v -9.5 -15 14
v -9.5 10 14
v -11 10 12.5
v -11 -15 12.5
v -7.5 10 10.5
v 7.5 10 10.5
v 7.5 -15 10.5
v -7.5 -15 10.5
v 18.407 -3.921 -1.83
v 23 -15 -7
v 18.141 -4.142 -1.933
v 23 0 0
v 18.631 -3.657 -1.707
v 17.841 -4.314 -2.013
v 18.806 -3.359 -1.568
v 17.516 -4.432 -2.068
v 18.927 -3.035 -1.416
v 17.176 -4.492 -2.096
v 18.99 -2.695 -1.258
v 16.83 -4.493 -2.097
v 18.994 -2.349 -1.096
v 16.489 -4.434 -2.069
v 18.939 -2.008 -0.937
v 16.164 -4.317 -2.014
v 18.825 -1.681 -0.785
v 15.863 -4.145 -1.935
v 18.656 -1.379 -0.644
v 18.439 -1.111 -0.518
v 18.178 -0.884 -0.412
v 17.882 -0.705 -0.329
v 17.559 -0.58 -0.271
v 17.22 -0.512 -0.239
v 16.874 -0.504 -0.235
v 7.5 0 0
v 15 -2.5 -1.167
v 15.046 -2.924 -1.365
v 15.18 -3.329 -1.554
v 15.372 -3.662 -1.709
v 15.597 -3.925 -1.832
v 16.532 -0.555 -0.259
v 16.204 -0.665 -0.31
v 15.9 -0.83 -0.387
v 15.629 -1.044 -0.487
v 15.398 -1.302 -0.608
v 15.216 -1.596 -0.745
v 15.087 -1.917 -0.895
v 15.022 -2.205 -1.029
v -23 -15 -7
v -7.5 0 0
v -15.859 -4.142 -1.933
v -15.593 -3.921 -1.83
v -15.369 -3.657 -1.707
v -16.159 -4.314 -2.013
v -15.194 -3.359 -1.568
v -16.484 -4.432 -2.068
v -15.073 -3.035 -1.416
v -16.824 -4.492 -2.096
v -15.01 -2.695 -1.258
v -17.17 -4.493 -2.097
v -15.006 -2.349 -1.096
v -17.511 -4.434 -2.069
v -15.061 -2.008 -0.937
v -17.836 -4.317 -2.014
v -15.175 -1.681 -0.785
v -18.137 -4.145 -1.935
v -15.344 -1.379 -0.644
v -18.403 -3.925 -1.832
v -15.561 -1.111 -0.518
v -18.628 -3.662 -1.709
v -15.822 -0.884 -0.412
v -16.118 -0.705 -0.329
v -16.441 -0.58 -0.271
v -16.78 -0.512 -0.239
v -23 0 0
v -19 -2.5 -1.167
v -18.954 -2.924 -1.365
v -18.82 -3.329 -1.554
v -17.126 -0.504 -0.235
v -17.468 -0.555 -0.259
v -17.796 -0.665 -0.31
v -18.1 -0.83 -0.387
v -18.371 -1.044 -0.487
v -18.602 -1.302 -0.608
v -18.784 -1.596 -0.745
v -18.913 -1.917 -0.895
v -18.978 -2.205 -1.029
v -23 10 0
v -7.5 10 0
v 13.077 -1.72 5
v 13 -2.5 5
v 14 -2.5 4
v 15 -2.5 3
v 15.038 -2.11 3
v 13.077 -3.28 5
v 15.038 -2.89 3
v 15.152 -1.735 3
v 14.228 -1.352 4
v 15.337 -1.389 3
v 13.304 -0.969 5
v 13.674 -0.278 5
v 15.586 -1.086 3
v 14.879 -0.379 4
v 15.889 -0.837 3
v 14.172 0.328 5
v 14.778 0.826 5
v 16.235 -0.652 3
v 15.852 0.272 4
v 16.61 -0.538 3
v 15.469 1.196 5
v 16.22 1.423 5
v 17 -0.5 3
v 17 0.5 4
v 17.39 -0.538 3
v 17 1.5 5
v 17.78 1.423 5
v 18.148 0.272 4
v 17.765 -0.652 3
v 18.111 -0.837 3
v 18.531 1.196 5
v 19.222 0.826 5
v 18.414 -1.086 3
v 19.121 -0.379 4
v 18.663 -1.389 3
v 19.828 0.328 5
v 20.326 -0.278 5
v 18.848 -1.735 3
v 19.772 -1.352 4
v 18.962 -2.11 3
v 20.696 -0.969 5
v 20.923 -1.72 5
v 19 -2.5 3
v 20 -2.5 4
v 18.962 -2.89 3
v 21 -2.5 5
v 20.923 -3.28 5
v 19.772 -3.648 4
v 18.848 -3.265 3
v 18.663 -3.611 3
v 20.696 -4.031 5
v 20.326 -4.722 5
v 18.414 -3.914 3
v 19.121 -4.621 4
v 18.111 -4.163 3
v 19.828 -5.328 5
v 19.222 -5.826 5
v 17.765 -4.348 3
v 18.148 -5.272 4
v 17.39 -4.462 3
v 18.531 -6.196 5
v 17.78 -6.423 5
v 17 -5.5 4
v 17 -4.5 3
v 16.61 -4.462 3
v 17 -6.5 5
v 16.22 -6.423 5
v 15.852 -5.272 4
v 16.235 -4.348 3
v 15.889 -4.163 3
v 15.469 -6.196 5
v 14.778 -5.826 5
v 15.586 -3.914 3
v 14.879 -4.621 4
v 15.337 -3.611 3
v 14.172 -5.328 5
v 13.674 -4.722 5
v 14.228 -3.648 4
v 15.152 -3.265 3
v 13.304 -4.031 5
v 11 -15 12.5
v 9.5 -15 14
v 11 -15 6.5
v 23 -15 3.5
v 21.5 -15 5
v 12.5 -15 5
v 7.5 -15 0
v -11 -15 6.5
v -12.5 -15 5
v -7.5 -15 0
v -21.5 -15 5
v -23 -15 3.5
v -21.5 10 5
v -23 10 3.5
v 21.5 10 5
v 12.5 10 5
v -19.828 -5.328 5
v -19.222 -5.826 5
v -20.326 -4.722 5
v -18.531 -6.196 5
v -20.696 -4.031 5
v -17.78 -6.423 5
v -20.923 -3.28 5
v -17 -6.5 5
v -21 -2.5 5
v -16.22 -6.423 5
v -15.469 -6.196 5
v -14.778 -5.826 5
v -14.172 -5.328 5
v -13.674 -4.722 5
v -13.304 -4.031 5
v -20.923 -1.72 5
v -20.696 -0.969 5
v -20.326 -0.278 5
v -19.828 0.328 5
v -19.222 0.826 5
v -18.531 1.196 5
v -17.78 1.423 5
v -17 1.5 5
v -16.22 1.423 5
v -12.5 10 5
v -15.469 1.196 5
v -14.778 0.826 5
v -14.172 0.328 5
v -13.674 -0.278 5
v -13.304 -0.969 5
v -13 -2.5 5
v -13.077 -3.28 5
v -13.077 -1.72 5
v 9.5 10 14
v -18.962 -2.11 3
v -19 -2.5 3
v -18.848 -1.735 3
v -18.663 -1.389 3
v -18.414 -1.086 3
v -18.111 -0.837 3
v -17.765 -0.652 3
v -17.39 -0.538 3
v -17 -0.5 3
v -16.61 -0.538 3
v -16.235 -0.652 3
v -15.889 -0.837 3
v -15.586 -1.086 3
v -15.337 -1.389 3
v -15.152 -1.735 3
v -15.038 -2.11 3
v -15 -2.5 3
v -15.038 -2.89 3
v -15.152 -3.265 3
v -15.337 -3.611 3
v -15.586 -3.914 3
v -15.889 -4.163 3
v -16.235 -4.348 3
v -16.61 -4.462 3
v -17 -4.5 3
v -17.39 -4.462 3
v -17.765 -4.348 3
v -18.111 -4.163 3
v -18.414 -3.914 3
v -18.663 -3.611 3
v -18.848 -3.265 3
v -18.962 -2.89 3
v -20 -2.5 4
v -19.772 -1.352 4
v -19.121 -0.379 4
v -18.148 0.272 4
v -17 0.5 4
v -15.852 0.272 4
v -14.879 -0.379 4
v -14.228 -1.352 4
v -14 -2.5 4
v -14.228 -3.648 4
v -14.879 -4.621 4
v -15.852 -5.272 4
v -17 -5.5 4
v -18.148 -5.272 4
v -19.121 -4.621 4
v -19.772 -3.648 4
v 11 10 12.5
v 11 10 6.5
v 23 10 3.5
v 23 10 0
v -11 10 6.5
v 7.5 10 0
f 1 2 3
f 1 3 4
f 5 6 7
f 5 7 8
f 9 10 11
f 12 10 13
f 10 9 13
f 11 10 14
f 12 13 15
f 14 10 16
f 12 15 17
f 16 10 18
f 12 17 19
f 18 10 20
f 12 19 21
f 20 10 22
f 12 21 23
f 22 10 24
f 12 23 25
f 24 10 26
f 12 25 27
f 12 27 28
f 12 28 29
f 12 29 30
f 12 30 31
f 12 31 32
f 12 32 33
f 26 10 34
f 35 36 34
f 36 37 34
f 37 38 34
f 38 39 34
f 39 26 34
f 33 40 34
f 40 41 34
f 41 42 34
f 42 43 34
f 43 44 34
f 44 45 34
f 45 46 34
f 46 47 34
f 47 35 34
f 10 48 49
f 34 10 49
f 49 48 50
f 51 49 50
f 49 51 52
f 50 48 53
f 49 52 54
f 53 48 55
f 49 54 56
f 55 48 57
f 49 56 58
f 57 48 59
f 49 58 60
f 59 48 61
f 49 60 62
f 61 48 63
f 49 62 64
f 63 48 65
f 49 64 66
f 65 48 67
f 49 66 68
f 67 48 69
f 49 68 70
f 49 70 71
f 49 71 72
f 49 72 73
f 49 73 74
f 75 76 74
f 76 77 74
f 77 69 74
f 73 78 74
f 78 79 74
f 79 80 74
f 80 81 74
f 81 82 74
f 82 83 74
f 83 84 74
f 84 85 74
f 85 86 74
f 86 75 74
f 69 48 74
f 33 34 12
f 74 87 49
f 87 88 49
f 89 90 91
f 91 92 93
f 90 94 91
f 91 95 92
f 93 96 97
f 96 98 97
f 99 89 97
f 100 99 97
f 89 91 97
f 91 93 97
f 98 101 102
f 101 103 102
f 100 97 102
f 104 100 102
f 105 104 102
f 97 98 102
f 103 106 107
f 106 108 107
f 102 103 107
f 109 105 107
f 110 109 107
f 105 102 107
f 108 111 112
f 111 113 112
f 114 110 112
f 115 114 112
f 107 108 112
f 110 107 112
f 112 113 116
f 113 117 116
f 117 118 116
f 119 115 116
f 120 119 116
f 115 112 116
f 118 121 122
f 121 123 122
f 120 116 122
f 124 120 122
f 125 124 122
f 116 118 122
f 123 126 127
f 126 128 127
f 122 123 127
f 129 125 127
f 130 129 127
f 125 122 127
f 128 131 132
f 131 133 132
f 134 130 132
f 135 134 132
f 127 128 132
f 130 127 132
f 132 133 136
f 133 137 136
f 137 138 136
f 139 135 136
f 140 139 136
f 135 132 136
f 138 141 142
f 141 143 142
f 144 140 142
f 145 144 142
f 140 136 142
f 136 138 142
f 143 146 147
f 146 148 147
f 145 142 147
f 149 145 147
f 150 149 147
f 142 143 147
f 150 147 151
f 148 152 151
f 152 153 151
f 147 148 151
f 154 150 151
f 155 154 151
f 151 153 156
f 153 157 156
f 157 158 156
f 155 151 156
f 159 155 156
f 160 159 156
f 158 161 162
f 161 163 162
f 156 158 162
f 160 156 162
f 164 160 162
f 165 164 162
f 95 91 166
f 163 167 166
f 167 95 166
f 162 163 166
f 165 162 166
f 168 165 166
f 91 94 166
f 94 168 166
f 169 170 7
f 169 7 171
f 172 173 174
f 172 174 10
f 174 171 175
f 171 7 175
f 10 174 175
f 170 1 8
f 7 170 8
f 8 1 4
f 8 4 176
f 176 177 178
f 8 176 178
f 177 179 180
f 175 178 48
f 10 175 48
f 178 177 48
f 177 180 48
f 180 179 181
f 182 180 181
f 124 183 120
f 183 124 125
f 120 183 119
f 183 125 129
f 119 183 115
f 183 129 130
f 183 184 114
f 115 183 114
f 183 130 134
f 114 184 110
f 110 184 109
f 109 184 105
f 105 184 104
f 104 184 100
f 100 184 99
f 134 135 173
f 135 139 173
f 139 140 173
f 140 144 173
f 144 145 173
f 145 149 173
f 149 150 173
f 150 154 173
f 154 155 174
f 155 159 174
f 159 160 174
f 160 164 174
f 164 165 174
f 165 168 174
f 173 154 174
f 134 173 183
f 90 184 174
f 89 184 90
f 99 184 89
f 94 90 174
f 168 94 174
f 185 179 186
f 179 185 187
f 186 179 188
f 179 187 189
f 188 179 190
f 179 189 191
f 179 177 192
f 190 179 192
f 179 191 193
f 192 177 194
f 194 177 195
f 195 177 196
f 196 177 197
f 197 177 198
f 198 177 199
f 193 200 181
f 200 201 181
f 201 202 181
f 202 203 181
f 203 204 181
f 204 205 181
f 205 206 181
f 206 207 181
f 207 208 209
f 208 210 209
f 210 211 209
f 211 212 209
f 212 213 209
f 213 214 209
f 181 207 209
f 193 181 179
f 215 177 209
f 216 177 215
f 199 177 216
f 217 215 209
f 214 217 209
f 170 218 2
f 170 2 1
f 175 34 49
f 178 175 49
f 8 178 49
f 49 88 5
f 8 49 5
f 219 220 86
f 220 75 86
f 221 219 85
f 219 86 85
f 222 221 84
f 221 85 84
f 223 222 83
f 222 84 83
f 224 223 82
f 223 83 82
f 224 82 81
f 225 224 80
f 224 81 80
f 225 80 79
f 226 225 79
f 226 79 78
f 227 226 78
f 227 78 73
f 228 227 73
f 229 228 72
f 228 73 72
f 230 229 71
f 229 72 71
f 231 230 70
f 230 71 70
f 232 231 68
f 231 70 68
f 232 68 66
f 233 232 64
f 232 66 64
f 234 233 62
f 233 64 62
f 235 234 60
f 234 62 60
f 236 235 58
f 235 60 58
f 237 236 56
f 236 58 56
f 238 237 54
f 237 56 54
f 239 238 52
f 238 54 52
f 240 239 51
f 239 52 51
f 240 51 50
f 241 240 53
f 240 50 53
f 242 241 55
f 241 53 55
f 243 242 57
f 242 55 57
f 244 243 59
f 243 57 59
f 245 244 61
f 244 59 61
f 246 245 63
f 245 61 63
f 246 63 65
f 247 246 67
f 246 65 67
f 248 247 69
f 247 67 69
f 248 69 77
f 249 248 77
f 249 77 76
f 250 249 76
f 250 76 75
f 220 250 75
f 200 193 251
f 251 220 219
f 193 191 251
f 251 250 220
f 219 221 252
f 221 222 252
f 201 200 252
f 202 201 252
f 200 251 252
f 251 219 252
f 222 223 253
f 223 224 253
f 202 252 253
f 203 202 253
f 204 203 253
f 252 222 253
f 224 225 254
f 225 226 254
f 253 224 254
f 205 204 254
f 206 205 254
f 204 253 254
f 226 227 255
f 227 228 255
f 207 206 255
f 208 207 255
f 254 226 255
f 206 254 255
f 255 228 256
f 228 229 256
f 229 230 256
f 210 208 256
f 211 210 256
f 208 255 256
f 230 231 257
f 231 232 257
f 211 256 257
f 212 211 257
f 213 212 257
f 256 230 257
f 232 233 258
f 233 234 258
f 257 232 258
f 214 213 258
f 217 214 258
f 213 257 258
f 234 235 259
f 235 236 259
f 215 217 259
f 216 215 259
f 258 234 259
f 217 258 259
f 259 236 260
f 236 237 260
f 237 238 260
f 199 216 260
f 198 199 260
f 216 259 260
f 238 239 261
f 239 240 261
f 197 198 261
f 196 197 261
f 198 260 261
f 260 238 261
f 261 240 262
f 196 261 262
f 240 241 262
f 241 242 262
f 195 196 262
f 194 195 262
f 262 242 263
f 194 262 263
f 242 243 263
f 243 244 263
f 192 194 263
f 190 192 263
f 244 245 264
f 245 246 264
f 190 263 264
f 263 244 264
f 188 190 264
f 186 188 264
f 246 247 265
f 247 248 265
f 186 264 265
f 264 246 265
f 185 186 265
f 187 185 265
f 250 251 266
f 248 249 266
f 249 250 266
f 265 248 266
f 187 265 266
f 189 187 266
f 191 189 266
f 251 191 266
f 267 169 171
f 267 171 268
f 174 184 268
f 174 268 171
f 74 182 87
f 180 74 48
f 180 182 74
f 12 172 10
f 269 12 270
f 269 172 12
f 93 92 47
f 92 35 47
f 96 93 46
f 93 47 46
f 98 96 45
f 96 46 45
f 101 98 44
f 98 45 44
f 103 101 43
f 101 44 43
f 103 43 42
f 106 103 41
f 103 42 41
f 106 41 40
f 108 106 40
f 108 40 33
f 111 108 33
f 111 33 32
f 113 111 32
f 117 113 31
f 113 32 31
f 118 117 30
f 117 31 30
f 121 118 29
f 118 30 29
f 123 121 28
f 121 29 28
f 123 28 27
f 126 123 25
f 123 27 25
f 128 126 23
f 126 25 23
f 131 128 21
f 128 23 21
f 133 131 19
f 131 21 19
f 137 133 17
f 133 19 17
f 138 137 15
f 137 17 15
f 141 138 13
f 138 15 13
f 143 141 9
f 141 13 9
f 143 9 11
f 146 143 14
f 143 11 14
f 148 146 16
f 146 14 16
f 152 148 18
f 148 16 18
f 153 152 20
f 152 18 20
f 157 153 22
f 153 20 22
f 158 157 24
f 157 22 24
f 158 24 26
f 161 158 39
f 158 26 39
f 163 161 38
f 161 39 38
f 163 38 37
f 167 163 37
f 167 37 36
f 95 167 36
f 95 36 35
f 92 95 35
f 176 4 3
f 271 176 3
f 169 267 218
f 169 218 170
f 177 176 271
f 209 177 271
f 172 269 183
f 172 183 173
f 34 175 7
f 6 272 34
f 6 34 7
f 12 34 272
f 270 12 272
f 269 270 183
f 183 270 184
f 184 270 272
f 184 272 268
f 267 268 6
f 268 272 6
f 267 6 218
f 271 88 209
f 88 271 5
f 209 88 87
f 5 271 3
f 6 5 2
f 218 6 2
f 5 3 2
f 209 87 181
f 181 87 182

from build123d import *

# Parameters (mm, degrees)
F1_DEPTH        = 11
F2_W            = 15
F2_H            = 10.5
F3_DEPTH        = 25.001
F5_DEPTH        = 12
F7_DEPTH        = 12
F8_SIZE         = 1.5
F10_D           = 4
F10_CSINK_D     = 8
F10_CSINK_ANGLE = 90


with BuildPart() as f1:
    # F0 (on Right) → F1 (new body, symmetric)
    with BuildSketch(Plane.YZ):
        Polygon((-15, -7), (0, 0), (10, 0), (10, 14), (-15, 14), align=None)
    extrude(amount=F1_DEPTH, both=True)

    # F2 (on face) → F3 (cut, through all)
    with BuildSketch(Plane(origin=(0, 10, 0), x_dir=(-1, 0, 0), z_dir=(0, 1, 0))):
        with Locations((0, 5.25)):
            Rectangle(F2_W, F2_H)
    extrude(amount=-F3_DEPTH, mode=Mode.SUBTRACT)

    # F4 (on face) → F5 (join)
    with BuildSketch(Plane(origin=(-11, 0, 0), x_dir=(0, -1, 0), z_dir=(-1, 0, 0))):
        Polygon((15, 5), (-10, 5), (-10, 0), (0, 0), (15, -7), align=None)
    extrude(amount=F5_DEPTH)

    # F6 (on face) → F7 (join)
    with BuildSketch(Plane.YZ.offset(11)):
        Polygon((10, 0), (10, 5), (-15, 5), (-15, -7), (0, 0), align=None)
    extrude(amount=F7_DEPTH)

    # F8
    f8_edges = [f1.edges().sort_by_distance(p)[0] for p in [
        (11, -2.5, 5),
        (11, -2.5, 14),
        (-11, -2.5, 14),
        (-11, -2.5, 5),
        (23, -2.5, 5),
        (-23, -2.5, 5),
    ]]
    chamfer(f8_edges, length=F8_SIZE)

    # F10 (through all)
    with Locations(Plane.XY.offset(5)):
        with Locations((-17, -2.5), (17, -2.5)):
            CounterSinkHole(F10_D / 2, F10_CSINK_D / 2, counter_sink_angle=F10_CSINK_ANGLE)


solid = f1.part
